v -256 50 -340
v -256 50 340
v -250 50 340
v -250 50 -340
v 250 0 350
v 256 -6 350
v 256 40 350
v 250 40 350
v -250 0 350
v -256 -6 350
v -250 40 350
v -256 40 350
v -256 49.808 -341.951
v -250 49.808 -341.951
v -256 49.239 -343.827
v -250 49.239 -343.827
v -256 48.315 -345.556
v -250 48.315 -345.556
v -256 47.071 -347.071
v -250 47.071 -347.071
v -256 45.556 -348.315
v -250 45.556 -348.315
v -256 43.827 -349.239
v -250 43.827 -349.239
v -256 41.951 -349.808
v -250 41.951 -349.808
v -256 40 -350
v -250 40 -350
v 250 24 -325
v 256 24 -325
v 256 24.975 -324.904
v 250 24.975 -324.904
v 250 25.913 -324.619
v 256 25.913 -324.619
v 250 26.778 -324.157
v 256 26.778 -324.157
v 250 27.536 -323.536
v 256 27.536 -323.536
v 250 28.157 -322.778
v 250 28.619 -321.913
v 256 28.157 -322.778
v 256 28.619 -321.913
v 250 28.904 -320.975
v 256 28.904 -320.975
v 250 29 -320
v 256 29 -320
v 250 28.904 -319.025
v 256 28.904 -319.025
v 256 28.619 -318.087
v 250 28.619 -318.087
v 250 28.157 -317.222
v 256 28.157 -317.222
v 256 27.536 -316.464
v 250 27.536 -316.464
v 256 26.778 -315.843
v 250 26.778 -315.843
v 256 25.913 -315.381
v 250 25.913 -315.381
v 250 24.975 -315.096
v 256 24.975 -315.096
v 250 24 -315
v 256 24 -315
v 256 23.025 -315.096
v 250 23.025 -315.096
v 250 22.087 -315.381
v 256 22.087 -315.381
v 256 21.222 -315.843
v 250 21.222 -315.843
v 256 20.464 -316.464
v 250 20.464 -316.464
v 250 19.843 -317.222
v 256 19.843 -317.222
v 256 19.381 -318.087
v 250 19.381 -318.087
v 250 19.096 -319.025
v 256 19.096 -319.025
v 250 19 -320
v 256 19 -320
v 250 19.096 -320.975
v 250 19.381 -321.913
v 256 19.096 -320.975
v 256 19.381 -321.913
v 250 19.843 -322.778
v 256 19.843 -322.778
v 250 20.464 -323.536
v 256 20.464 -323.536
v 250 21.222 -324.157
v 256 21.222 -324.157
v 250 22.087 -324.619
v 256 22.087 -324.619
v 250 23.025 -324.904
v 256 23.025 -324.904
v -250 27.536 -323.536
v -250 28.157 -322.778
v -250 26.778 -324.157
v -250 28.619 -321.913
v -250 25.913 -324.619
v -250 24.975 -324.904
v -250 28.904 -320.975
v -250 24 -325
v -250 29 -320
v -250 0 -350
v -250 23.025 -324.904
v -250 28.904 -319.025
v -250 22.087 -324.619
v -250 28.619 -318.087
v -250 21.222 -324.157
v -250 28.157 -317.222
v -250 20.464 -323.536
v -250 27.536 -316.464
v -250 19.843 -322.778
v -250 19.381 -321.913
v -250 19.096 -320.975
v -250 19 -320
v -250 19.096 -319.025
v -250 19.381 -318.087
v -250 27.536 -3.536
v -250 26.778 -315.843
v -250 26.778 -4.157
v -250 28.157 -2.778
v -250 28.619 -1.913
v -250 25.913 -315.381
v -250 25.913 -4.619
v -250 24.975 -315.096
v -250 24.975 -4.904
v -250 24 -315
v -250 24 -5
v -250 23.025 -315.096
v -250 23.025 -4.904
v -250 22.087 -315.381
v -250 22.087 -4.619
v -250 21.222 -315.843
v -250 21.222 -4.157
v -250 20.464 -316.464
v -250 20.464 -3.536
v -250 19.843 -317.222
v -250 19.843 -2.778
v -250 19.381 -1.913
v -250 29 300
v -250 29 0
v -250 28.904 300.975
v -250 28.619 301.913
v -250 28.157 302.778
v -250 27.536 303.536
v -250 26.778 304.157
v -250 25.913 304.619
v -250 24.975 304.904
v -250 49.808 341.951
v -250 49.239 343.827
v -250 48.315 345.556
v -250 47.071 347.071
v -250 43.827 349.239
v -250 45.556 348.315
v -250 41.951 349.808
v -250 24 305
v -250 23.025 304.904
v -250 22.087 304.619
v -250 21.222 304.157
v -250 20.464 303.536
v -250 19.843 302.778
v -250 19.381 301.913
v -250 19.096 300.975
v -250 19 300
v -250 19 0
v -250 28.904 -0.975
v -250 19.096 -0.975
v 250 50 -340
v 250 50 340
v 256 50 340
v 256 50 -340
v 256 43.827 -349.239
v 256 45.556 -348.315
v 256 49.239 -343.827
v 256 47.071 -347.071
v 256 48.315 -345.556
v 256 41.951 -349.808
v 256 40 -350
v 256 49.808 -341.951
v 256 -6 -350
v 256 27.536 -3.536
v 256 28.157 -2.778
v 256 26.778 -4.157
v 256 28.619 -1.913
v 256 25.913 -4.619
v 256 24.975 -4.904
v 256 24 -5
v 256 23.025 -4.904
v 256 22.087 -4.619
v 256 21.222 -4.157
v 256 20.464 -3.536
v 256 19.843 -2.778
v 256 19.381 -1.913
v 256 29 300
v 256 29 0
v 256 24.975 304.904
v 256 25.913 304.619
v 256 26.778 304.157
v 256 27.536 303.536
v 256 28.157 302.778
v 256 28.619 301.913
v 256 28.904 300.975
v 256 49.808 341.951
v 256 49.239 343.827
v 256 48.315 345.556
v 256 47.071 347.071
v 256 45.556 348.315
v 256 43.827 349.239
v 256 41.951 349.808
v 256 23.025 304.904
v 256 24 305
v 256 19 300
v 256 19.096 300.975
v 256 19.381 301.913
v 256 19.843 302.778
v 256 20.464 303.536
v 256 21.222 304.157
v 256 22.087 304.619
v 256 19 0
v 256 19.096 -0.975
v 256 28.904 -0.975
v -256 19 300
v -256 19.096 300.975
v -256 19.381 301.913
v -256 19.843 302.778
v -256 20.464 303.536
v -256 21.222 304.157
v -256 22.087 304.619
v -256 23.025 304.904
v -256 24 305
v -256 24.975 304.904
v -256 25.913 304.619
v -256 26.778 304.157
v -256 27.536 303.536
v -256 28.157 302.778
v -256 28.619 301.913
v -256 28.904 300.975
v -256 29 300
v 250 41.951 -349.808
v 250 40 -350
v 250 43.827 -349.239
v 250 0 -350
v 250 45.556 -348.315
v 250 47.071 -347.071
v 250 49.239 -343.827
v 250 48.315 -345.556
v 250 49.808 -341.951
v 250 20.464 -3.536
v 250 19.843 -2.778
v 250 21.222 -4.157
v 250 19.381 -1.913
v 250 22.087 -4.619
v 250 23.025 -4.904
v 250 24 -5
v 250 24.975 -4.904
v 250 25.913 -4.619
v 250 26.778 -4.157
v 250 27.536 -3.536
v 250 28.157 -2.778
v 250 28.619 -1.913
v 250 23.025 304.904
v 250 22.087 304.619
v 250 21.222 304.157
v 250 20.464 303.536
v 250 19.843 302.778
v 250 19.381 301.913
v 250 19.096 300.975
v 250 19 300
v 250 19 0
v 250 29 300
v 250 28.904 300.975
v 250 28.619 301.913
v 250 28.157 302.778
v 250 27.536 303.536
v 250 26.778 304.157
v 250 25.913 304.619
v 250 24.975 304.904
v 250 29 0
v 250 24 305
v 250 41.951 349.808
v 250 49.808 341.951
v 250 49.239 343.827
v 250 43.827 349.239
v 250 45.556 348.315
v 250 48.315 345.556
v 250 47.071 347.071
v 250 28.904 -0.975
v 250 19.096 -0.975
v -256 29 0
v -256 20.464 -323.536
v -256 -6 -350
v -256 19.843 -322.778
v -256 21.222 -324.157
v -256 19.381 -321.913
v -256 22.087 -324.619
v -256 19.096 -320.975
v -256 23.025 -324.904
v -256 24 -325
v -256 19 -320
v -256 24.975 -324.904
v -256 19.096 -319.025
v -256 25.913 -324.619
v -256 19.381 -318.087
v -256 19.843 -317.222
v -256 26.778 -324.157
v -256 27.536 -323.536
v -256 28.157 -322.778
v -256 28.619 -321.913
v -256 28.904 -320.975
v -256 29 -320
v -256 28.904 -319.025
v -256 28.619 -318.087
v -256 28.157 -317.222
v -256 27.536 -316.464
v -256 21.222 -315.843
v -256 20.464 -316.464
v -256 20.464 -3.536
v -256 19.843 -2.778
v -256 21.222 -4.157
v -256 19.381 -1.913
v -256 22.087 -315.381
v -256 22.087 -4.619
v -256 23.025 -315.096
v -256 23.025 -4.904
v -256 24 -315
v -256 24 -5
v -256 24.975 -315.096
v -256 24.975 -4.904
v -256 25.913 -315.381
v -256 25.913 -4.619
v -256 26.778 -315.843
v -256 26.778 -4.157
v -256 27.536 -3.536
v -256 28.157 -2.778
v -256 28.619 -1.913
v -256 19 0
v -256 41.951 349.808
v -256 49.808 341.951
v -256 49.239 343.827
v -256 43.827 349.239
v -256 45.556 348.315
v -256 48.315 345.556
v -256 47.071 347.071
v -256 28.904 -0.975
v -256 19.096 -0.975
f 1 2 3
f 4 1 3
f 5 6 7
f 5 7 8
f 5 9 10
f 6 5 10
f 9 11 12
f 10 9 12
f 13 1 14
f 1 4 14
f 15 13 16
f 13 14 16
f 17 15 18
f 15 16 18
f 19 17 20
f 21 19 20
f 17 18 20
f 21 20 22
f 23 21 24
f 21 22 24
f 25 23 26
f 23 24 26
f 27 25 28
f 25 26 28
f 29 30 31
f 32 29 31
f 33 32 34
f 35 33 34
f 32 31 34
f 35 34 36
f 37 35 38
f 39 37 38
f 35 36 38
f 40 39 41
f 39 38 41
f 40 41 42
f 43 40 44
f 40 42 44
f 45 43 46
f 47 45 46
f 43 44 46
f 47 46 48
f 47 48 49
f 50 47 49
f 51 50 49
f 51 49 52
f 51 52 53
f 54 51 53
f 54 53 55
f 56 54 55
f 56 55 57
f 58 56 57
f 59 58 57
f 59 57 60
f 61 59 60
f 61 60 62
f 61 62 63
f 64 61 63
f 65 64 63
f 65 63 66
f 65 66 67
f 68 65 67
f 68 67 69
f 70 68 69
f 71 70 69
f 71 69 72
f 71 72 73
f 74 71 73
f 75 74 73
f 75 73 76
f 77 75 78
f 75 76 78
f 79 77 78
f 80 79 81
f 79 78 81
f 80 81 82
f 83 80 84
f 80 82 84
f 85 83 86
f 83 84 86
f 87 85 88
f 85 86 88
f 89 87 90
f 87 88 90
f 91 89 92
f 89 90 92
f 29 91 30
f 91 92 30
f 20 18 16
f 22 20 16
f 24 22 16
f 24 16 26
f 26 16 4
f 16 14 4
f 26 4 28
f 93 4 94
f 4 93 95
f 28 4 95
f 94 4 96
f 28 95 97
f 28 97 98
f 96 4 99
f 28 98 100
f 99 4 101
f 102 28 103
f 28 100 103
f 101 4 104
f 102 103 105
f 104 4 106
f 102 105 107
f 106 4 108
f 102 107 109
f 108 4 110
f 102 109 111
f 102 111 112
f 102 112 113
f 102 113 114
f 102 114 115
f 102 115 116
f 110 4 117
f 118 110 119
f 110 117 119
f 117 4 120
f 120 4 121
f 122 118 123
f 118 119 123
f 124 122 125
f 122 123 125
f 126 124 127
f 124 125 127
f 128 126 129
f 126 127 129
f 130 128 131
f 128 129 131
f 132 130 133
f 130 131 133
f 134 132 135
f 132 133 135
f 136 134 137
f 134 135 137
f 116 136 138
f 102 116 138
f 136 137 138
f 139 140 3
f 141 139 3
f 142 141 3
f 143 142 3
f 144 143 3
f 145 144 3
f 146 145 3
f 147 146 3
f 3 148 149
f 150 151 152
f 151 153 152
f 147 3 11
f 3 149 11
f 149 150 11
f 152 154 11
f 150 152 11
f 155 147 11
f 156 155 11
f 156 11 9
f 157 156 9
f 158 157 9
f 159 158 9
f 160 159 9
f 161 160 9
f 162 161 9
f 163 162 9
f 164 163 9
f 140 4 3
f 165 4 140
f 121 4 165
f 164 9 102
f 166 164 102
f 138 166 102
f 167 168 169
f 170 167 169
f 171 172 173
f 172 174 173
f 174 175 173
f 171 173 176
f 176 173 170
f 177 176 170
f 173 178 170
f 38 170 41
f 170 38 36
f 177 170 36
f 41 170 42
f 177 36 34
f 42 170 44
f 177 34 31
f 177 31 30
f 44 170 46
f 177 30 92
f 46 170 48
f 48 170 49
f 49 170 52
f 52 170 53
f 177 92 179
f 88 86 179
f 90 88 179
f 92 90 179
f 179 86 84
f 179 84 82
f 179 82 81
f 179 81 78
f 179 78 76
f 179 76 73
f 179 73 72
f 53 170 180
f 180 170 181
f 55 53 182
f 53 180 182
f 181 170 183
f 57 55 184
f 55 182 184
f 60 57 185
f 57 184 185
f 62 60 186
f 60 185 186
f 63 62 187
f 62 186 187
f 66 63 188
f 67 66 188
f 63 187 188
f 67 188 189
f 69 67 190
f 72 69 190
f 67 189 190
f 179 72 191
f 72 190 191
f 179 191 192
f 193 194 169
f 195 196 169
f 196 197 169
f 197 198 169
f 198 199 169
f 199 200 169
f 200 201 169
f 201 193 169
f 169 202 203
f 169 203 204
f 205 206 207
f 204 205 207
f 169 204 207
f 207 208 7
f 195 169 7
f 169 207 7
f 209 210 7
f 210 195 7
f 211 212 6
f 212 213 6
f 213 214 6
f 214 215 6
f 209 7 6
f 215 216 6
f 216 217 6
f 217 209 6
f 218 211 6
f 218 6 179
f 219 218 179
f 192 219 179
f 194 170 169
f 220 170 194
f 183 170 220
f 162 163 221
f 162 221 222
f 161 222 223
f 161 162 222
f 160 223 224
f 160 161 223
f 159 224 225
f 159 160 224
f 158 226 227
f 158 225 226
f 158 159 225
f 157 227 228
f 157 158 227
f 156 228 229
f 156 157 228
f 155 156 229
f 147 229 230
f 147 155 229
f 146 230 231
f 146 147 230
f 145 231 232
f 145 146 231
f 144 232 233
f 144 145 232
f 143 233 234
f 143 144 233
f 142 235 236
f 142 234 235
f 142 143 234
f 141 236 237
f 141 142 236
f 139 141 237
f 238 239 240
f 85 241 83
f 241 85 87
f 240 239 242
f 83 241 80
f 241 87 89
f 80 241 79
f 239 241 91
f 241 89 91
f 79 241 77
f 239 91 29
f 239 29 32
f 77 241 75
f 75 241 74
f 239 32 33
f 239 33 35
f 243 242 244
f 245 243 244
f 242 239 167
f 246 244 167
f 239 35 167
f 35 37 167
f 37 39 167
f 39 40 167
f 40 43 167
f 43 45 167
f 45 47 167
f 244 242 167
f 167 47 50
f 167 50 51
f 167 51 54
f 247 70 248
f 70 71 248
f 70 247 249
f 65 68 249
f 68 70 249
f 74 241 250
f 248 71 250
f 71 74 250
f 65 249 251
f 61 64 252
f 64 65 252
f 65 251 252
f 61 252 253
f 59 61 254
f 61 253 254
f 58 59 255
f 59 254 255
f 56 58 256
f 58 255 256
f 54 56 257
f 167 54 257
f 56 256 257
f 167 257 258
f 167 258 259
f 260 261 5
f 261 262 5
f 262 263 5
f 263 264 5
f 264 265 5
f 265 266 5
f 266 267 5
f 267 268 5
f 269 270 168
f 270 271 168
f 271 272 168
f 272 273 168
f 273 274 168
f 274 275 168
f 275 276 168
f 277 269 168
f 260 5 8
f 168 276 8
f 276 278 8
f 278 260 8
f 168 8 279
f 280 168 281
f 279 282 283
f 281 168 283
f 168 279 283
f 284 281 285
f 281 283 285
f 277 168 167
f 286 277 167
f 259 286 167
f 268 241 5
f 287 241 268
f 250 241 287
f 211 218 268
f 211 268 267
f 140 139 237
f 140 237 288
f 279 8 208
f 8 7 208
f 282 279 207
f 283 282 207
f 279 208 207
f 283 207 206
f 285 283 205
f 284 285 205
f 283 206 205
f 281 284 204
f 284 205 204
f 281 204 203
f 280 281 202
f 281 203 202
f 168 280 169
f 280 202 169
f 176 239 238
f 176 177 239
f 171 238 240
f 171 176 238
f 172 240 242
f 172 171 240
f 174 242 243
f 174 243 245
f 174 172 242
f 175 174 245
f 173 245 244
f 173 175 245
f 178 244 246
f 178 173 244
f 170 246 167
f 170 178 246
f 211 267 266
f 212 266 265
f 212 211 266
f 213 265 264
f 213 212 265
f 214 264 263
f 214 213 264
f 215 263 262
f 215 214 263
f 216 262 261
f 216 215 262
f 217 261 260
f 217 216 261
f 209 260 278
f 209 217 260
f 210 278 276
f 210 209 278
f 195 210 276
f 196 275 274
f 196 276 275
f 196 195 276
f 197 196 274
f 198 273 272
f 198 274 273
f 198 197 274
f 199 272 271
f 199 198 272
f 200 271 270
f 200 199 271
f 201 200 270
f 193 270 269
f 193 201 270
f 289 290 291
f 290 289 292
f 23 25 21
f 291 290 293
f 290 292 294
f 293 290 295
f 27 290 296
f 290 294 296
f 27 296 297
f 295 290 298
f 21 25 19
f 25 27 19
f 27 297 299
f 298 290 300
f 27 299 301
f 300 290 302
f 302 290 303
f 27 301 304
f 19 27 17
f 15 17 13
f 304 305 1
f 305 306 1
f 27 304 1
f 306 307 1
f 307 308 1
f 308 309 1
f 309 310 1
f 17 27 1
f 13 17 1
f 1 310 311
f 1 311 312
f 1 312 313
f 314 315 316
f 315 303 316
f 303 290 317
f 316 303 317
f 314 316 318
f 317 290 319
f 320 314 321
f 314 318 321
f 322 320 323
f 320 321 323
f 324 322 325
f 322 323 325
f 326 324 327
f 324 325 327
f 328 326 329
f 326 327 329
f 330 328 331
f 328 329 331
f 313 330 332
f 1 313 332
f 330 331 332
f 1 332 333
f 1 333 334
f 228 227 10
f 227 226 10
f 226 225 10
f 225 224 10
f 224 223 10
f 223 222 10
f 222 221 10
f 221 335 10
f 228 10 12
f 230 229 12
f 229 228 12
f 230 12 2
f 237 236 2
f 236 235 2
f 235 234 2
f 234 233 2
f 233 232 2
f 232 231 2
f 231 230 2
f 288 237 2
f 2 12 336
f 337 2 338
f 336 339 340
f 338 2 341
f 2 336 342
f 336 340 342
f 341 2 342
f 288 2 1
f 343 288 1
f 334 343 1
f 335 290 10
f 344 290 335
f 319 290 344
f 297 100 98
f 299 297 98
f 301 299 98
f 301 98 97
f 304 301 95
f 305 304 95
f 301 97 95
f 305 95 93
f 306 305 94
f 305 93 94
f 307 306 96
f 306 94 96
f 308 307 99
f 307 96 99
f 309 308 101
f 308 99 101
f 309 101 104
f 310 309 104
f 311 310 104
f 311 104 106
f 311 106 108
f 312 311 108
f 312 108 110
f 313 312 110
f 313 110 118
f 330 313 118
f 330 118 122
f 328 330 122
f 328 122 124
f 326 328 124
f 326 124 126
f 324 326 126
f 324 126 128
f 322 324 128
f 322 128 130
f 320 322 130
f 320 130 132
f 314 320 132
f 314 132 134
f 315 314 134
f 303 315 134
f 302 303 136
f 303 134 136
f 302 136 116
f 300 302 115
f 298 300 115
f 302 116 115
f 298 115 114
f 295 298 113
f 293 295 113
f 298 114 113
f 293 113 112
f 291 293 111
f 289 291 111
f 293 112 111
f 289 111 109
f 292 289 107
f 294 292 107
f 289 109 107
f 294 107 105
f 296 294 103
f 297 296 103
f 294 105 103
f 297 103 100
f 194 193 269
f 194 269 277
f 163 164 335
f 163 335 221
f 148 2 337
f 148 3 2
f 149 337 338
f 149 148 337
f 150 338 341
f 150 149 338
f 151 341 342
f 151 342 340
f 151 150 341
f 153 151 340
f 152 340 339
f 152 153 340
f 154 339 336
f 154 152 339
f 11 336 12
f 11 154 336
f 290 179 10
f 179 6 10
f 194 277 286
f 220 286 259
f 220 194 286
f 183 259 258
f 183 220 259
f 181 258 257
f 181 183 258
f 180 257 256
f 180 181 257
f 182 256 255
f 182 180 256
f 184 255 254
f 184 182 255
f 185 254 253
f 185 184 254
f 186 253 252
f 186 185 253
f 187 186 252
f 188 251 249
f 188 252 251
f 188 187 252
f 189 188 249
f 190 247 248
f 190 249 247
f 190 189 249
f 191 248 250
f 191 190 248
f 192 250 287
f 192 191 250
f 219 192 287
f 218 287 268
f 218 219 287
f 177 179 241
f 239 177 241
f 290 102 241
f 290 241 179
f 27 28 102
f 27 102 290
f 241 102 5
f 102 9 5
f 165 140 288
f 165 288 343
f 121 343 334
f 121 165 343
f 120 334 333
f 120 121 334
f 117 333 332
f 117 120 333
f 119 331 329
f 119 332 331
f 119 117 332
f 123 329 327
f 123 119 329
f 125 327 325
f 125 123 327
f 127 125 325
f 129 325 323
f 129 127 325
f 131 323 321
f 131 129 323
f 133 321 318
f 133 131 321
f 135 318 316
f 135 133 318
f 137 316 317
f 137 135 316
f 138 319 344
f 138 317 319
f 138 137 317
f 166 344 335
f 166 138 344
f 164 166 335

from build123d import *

# Parameters (mm, degrees)
EXTRUDE_THIN1_DEPTH = 350
SKETCH2_R           = 5
CUT_EXTRUDE1_DEPTH  = 623.208968113
FILLET1_R           = 10


with BuildPart() as part:
    # Sketch1 → Extrude-Thin1 (new, symmetric)
    with BuildSketch(Plane.XY):
        Polygon((-250, 50), (-250, 0), (250, 0), (250, 50), (256, 50), (256, -6), (-256, -6), (-256, 50), align=None)
    extrude(amount=EXTRUDE_THIN1_DEPTH, both=True)

    # Sketch2 → Cut-Extrude1 (cut, through all)
    with BuildSketch(Plane(origin=(256, 0, 0), x_dir=(0, 0, -1), z_dir=(1, 0, 0))):
        with Locations((320, 24)):
            Circle(SKETCH2_R)
        with BuildLine():
            Line((-300, 29), (0, 29))
            ThreePointArc((0, 29), (5, 24), (0, 19))
            Line((0, 19), (-300, 19))
            ThreePointArc((-300, 19), (-305, 24), (-300, 29))
        make_face()
    extrude(amount=-CUT_EXTRUDE1_DEPTH, mode=Mode.SUBTRACT)

    # Fillet1
    fillet1_edges = [part.edges().sort_by_distance(p)[0] for p in [
        (-253, 50, 350),
        (253, 50, 350),
        (-253, 50, -350),
        (253, 50, -350),
    ]]
    fillet(fillet1_edges, radius=FILLET1_R)


solid = part.part
